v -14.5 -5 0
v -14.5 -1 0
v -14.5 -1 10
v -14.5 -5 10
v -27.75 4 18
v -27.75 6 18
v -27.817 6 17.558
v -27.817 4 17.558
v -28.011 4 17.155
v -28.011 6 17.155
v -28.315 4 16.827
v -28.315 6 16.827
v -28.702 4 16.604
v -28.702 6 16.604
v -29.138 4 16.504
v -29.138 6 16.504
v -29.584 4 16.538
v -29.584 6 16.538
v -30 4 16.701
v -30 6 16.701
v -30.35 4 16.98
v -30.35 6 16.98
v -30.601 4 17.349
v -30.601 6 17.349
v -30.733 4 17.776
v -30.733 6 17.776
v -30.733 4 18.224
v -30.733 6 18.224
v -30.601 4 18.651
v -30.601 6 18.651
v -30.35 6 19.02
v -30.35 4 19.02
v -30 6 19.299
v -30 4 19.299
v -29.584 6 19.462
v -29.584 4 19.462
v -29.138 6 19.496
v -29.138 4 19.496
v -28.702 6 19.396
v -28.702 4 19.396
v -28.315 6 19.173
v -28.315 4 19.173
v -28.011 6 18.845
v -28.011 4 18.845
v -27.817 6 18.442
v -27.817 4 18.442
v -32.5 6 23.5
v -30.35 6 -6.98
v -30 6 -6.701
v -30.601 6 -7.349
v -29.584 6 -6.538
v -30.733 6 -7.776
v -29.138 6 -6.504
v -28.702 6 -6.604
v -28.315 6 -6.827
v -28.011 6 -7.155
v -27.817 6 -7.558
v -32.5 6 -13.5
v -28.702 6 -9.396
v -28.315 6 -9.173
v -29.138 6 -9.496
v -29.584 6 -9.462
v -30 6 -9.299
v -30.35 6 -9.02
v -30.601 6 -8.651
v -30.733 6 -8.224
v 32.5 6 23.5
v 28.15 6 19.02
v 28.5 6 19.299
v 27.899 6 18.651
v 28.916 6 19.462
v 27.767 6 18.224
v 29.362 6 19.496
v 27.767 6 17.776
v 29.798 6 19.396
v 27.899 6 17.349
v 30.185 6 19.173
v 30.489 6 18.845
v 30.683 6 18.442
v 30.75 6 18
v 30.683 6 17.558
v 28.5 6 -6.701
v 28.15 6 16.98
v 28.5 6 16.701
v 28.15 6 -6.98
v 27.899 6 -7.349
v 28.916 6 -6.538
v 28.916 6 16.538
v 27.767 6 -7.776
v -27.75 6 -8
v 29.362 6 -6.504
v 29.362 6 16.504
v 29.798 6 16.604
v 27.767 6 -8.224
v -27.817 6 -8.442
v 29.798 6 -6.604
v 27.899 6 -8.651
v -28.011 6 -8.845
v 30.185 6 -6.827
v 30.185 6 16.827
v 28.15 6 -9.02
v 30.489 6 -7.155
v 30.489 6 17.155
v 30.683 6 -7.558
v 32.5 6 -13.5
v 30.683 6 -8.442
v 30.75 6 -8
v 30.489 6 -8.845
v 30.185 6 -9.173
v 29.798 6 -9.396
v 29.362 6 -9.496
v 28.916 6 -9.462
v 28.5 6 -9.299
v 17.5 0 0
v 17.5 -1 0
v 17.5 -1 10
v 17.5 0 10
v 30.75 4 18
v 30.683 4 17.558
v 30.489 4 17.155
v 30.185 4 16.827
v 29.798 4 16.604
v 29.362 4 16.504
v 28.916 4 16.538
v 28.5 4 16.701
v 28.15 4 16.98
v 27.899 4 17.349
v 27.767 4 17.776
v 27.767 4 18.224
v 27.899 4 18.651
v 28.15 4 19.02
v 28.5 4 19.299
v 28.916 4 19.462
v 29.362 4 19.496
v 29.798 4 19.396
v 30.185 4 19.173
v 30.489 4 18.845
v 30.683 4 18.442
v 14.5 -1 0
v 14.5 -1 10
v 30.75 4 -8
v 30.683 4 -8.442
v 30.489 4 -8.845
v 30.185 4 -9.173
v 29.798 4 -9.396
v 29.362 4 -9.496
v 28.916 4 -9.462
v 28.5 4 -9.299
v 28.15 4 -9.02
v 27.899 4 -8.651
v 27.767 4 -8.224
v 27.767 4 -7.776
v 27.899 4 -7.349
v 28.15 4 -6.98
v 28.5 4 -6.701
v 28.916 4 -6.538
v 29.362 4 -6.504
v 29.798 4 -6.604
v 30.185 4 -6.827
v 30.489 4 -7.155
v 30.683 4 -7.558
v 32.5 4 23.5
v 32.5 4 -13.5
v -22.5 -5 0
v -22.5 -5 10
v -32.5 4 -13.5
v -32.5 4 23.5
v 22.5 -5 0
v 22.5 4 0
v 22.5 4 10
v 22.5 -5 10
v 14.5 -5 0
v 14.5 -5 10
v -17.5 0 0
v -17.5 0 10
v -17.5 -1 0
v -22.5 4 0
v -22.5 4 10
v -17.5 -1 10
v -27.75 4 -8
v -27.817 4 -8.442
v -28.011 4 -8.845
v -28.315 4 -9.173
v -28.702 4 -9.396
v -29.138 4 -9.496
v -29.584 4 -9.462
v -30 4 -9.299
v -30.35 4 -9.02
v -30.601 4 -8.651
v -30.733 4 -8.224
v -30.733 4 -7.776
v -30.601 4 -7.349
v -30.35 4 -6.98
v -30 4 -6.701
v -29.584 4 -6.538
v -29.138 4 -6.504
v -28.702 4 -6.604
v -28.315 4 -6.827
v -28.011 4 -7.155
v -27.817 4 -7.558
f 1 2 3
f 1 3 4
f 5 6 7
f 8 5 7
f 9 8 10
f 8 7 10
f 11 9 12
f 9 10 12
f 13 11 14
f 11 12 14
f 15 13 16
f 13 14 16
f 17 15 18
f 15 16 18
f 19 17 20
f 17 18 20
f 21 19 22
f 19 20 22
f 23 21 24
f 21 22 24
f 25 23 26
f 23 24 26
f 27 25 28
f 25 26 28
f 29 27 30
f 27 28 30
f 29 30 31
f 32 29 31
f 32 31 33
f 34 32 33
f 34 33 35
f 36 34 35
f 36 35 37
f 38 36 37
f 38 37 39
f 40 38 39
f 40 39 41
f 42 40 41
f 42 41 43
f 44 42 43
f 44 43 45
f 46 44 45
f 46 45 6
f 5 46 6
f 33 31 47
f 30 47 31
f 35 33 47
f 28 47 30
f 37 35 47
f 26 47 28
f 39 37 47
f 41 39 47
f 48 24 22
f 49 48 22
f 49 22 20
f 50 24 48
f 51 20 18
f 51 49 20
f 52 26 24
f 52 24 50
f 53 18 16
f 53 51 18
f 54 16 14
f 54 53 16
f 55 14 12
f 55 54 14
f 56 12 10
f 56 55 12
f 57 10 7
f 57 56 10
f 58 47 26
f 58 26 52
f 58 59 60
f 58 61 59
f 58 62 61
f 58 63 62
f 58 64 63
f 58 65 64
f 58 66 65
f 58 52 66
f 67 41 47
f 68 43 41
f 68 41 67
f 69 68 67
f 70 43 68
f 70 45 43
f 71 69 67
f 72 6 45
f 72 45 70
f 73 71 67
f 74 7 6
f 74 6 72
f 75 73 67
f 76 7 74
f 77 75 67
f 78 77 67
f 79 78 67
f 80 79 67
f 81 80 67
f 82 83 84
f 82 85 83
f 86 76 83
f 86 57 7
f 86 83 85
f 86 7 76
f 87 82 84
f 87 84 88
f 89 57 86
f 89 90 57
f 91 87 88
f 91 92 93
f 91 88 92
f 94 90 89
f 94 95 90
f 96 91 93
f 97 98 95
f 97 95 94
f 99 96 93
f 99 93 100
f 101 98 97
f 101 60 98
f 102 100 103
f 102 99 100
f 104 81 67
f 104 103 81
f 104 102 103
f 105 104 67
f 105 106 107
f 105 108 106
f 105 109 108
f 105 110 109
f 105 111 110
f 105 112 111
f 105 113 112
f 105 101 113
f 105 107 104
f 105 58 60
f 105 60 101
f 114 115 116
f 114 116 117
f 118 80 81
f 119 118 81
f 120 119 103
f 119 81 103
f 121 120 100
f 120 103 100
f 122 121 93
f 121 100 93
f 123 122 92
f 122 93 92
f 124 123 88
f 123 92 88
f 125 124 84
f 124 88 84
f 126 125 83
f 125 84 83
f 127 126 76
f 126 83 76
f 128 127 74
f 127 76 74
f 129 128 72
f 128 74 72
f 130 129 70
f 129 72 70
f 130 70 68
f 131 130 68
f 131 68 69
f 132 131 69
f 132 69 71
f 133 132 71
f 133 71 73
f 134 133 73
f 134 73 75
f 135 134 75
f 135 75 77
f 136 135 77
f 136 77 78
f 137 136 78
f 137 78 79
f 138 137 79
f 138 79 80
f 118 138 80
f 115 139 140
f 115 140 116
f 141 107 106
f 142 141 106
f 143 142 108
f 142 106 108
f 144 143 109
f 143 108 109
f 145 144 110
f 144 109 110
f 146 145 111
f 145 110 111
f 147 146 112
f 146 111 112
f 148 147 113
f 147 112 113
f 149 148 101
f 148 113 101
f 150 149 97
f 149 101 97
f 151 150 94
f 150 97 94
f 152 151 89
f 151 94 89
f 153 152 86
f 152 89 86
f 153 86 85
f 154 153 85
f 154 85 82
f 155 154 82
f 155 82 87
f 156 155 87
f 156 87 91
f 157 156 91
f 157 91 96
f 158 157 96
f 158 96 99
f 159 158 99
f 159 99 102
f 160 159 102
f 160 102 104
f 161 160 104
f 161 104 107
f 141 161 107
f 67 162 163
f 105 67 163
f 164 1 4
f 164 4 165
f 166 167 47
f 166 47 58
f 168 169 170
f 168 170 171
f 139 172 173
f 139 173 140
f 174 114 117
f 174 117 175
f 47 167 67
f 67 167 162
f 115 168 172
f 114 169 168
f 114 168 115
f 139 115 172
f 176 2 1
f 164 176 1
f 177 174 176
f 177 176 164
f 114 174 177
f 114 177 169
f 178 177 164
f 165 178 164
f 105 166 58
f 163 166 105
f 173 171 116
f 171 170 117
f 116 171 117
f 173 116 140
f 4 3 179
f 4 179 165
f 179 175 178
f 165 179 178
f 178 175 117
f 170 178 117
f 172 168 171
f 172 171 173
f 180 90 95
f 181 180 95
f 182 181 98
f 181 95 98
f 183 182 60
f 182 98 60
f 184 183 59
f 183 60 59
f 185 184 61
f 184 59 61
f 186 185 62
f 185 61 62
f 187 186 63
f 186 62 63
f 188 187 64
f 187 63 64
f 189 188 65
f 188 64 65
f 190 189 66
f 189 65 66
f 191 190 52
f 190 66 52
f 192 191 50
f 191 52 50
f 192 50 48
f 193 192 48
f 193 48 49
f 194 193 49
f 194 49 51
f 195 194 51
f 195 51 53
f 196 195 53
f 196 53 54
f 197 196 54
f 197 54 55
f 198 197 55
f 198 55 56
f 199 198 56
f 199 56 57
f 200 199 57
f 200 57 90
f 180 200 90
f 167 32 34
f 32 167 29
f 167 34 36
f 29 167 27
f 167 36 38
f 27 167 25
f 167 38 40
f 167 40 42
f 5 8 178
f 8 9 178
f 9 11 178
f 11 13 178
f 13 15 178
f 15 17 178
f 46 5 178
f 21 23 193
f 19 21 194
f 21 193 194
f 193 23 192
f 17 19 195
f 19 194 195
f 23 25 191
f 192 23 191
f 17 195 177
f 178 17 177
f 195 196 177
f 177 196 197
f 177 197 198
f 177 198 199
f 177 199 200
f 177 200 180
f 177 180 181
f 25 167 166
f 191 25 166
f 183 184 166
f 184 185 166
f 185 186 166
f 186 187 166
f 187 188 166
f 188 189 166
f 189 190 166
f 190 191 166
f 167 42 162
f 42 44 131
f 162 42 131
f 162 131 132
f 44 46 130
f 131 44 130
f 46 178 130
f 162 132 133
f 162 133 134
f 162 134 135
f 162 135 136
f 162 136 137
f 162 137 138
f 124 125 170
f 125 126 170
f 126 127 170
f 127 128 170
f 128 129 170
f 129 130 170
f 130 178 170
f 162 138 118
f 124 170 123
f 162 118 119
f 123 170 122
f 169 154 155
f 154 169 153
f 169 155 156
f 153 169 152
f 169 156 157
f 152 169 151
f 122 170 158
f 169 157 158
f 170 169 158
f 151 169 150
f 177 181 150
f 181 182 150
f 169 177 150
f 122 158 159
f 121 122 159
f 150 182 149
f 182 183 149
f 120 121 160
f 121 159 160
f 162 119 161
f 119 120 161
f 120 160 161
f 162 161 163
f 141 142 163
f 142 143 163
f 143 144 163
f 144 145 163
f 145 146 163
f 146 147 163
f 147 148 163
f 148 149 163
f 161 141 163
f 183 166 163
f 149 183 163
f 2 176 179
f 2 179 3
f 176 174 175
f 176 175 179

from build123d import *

# Parameters (mm, degrees)
BOSS_EXTRUDE1_DEPTH = 10
SKETCH3_W           = 65
SKETCH3_H           = 37
BOSS_EXTRUDE2_DEPTH = 2
SKETCH4_R           = 1.5
CUT_EXTRUDE1_DEPTH  = 5


with BuildPart() as part:
    # Sketch2 → Boss-Extrude1 (new body)
    with BuildSketch(Plane.XY):
        Polygon((-17.5, 0), (-17.5, -1), (-14.5, -1), (-14.5, -5), (-22.5, -5), (-22.5, 0), (-22.5, 4), (22.5, 4), (22.5, -5), (14.5, -5), (14.5, -1), (17.5, -1), (17.5, 0), align=None)
    extrude(amount=BOSS_EXTRUDE1_DEPTH)

    # Sketch3 → Boss-Extrude2 (add)
    with BuildSketch(Plane(origin=(0, 4, 0), x_dir=(1, 0, 0), z_dir=(0, 1, 0))):
        with Locations((0, -5)):
            Rectangle(SKETCH3_W, SKETCH3_H)
    extrude(amount=BOSS_EXTRUDE2_DEPTH)

    # Sketch4 → Cut-Extrude1 (cut)
    with BuildSketch(Plane(origin=(0, 6, 0), x_dir=(1, 0, 0), z_dir=(0, 1, 0))):
        with Locations((-29.25, 8)):
            Circle(SKETCH4_R)
        with Locations((-29.25, -18)):
            Circle(SKETCH4_R)
        with Locations((29.25, -18)):
            Circle(SKETCH4_R)
        with Locations((29.25, 8)):
            Circle(SKETCH4_R)
    extrude(amount=-CUT_EXTRUDE1_DEPTH, mode=Mode.SUBTRACT)


solid = part.part
